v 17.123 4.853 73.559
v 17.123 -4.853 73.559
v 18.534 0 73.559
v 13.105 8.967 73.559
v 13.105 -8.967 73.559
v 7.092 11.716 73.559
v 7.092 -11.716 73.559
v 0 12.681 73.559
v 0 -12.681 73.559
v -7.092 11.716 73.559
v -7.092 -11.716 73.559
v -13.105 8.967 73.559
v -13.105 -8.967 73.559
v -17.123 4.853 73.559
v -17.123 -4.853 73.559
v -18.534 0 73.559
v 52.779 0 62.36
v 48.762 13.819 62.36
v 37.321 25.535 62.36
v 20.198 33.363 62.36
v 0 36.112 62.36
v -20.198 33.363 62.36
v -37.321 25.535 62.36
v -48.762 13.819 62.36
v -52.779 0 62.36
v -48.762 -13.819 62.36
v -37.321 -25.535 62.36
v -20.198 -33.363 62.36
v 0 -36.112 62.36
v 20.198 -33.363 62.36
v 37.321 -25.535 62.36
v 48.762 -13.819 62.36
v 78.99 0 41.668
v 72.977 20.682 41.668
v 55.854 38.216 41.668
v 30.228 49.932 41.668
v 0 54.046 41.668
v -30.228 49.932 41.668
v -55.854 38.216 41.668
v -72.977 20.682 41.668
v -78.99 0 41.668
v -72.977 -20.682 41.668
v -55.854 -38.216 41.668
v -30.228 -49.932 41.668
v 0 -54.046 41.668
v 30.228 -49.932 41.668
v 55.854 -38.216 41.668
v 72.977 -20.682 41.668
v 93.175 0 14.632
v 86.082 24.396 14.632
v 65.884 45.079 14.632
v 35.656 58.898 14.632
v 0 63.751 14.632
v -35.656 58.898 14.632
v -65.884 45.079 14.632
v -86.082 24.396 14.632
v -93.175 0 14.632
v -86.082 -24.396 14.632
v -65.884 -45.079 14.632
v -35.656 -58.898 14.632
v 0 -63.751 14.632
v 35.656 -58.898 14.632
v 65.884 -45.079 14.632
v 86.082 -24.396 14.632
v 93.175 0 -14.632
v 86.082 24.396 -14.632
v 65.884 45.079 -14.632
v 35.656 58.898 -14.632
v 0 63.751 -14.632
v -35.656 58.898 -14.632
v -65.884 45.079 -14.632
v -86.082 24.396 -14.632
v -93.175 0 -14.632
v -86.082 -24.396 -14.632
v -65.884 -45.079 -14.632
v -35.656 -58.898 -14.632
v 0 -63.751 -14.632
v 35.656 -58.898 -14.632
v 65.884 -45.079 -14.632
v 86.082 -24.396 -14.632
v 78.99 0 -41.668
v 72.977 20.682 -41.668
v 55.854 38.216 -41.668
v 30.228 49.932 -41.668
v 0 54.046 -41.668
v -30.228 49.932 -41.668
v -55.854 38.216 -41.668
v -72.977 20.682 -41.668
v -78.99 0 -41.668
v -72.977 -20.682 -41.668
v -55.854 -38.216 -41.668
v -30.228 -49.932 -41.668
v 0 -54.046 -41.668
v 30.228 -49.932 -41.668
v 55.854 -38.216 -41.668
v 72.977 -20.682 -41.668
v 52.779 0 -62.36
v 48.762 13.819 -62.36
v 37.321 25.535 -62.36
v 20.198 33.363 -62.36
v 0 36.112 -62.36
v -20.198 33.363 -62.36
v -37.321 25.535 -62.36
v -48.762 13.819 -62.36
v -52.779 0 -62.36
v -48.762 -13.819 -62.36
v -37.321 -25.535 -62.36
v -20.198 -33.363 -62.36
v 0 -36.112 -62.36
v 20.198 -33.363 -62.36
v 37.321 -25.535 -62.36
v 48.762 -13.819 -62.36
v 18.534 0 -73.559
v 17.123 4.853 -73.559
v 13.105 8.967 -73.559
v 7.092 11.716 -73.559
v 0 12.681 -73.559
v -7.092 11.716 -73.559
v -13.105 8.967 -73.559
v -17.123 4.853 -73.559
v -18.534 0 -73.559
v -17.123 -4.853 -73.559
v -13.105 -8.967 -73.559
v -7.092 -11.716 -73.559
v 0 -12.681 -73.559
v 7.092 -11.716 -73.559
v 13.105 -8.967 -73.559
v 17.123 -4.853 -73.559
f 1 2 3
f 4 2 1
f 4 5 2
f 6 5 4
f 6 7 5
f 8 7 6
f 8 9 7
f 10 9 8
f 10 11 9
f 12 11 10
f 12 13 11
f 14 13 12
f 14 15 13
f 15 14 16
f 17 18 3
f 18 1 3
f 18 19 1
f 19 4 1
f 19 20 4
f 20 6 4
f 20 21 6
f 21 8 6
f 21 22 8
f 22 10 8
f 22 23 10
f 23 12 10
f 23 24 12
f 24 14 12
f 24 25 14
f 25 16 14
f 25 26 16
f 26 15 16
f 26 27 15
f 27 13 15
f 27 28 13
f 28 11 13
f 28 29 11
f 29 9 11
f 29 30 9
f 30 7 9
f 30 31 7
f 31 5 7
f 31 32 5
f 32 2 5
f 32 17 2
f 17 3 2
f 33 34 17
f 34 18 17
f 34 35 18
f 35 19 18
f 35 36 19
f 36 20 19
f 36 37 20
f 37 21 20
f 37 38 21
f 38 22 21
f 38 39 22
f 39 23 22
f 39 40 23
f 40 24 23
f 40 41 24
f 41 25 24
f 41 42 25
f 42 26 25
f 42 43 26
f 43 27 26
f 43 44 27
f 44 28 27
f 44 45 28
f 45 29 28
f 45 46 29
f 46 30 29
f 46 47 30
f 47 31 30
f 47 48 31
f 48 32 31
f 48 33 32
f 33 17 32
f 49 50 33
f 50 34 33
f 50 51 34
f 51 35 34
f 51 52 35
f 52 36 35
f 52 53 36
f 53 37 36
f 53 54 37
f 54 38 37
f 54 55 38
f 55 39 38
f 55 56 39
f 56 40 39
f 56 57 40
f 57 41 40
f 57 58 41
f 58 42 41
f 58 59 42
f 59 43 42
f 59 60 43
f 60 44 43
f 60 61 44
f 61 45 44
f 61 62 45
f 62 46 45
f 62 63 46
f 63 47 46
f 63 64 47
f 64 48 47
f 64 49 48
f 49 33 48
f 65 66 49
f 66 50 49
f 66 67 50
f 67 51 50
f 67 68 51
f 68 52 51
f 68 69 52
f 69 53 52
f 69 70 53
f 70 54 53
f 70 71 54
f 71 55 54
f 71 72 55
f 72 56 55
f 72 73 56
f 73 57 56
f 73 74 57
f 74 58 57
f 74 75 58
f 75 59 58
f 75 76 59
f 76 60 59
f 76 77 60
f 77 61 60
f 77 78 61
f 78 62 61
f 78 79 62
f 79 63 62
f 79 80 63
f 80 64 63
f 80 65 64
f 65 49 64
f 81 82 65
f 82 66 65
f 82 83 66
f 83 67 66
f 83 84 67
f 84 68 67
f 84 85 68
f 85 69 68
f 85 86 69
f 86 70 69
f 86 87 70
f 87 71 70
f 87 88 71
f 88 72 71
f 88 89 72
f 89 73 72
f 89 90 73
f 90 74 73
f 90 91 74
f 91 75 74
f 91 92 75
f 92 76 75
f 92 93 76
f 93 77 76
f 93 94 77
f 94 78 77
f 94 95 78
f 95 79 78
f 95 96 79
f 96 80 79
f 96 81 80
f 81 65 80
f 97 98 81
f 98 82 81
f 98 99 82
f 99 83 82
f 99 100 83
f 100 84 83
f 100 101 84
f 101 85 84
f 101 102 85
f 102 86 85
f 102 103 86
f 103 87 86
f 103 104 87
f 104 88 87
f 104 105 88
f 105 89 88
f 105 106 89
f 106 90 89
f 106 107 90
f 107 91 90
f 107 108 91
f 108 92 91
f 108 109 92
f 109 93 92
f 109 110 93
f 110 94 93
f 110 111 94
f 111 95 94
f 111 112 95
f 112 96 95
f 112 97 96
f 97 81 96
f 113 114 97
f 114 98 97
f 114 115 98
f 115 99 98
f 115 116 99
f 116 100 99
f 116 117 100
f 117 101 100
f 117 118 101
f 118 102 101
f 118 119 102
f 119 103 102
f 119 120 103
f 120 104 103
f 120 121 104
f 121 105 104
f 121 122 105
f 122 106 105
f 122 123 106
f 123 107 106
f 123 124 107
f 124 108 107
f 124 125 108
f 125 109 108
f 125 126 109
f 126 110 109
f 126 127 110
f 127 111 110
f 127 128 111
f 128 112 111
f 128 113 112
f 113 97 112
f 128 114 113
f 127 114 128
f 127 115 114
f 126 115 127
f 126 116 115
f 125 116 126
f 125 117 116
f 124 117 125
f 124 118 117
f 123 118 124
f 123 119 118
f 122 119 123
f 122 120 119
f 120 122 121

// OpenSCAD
// Generated by SolidPython 1.0.1 on 2020-07-29 00:46:54


scale(v = [19, 13, 15]) {
	sphere(r = 5);
}
/***********************************************
*********      SolidPython code:      **********
************************************************
 
# import packages: SolidPython
from solid import *
from solid.utils import *
from itertools import chain, combinations, permutations


class Resize:

    def __init__(self, scad_file):
        self.scad_file = scad_file
        #self.scad_file = import_scad(scad_file)
        # cone/cylinder param:
        self.r1 = 0
        self.r2 = 0
        self.h = 0
        # rectangular prism param:
        self.w = 0
        self.l = 0
        # ellipse param:
        self.r = 0

    # import OpenScad code (file name corresponds to shape)


    # classify shape + parameters
    def assign(self, param1, param2, param3):
        if self.scad_file == 'cone.scad':
            self.r1 = param1
            self.r2 = param2
            self.h = param3
        elif self.scad_file == 'cylinder.scad':
            self.r1 = param1
            self.r2 = param2
            self.h = param3
        elif self.scad_file == 'rectangularPrism.scad':
            self.h = param1
            self.l = param2
            self.w = param3
        else:
            self.r = param1
            self.h = param2

    # resize parameters
    def iterate(self):
        x = range(3, 20, 2)
        i = 1
        if self.scad_file == 'cone.scad':
            tempList = list(permutations(x, 2))
            for temp in tempList:
                param1 = temp[0]
                param2 = temp[1]
                filepath = 'produced_scad_files/' + 'cone' + str(param1) + '_' + str(param2) + '_' + '.scad'
                scad_render_to_file(cylinder(h=param1, r1=param2, r2=0), filepath)

        elif self.scad_file == 'cylinder.scad':
            tempList = list(permutations(x, 3))
            for temp in tempList:
                param1 = temp[0]
                param2 = temp[1]
                filepath = 'produced_scad_files/' + 'cylinder' + str(param1) + '_' + str(param2) + '_' + '.scad'
                scad_render_to_file(cylinder(h=param1, r1=param2, r2=param2), filepath)

        elif self.scad_file == 'rectangularPrism.scad':
            tempList = list(permutations(x, 3))
            for temp in tempList:
                param1 = temp[0]
                param2 = temp[1]
                param3 = temp[2]
                filepath = 'produced_scad_files/' + 'rectangularPrism' + str(param1) + '_' + str(param2) + '_' + str(
                    param3) + '.scad'
                scad_render_to_file(cube(size=(param1, param2, param3)), filepath)

        elif self.scad_file == 'ellipse.scad':
            tempList = list(permutations(x, 4))
            for temp in tempList:
                param1 = temp[0]
                param2 = temp[1]
                param3 = temp[2]
                param4 = temp[3]
                filepath = 'produced_scad_files/' + 'ellipse' + str(param1) + '_' + str(param2) + '_' + str(param3) + '_' + str(param4) + '.scad'
                scad_render_to_file(scale([param1, param2, param3])(sphere(r=param4)), filepath)

    def render_to_scadfile(self):
        scad_render_to_file(scad, 'example.scad') 
 
************************************************/
